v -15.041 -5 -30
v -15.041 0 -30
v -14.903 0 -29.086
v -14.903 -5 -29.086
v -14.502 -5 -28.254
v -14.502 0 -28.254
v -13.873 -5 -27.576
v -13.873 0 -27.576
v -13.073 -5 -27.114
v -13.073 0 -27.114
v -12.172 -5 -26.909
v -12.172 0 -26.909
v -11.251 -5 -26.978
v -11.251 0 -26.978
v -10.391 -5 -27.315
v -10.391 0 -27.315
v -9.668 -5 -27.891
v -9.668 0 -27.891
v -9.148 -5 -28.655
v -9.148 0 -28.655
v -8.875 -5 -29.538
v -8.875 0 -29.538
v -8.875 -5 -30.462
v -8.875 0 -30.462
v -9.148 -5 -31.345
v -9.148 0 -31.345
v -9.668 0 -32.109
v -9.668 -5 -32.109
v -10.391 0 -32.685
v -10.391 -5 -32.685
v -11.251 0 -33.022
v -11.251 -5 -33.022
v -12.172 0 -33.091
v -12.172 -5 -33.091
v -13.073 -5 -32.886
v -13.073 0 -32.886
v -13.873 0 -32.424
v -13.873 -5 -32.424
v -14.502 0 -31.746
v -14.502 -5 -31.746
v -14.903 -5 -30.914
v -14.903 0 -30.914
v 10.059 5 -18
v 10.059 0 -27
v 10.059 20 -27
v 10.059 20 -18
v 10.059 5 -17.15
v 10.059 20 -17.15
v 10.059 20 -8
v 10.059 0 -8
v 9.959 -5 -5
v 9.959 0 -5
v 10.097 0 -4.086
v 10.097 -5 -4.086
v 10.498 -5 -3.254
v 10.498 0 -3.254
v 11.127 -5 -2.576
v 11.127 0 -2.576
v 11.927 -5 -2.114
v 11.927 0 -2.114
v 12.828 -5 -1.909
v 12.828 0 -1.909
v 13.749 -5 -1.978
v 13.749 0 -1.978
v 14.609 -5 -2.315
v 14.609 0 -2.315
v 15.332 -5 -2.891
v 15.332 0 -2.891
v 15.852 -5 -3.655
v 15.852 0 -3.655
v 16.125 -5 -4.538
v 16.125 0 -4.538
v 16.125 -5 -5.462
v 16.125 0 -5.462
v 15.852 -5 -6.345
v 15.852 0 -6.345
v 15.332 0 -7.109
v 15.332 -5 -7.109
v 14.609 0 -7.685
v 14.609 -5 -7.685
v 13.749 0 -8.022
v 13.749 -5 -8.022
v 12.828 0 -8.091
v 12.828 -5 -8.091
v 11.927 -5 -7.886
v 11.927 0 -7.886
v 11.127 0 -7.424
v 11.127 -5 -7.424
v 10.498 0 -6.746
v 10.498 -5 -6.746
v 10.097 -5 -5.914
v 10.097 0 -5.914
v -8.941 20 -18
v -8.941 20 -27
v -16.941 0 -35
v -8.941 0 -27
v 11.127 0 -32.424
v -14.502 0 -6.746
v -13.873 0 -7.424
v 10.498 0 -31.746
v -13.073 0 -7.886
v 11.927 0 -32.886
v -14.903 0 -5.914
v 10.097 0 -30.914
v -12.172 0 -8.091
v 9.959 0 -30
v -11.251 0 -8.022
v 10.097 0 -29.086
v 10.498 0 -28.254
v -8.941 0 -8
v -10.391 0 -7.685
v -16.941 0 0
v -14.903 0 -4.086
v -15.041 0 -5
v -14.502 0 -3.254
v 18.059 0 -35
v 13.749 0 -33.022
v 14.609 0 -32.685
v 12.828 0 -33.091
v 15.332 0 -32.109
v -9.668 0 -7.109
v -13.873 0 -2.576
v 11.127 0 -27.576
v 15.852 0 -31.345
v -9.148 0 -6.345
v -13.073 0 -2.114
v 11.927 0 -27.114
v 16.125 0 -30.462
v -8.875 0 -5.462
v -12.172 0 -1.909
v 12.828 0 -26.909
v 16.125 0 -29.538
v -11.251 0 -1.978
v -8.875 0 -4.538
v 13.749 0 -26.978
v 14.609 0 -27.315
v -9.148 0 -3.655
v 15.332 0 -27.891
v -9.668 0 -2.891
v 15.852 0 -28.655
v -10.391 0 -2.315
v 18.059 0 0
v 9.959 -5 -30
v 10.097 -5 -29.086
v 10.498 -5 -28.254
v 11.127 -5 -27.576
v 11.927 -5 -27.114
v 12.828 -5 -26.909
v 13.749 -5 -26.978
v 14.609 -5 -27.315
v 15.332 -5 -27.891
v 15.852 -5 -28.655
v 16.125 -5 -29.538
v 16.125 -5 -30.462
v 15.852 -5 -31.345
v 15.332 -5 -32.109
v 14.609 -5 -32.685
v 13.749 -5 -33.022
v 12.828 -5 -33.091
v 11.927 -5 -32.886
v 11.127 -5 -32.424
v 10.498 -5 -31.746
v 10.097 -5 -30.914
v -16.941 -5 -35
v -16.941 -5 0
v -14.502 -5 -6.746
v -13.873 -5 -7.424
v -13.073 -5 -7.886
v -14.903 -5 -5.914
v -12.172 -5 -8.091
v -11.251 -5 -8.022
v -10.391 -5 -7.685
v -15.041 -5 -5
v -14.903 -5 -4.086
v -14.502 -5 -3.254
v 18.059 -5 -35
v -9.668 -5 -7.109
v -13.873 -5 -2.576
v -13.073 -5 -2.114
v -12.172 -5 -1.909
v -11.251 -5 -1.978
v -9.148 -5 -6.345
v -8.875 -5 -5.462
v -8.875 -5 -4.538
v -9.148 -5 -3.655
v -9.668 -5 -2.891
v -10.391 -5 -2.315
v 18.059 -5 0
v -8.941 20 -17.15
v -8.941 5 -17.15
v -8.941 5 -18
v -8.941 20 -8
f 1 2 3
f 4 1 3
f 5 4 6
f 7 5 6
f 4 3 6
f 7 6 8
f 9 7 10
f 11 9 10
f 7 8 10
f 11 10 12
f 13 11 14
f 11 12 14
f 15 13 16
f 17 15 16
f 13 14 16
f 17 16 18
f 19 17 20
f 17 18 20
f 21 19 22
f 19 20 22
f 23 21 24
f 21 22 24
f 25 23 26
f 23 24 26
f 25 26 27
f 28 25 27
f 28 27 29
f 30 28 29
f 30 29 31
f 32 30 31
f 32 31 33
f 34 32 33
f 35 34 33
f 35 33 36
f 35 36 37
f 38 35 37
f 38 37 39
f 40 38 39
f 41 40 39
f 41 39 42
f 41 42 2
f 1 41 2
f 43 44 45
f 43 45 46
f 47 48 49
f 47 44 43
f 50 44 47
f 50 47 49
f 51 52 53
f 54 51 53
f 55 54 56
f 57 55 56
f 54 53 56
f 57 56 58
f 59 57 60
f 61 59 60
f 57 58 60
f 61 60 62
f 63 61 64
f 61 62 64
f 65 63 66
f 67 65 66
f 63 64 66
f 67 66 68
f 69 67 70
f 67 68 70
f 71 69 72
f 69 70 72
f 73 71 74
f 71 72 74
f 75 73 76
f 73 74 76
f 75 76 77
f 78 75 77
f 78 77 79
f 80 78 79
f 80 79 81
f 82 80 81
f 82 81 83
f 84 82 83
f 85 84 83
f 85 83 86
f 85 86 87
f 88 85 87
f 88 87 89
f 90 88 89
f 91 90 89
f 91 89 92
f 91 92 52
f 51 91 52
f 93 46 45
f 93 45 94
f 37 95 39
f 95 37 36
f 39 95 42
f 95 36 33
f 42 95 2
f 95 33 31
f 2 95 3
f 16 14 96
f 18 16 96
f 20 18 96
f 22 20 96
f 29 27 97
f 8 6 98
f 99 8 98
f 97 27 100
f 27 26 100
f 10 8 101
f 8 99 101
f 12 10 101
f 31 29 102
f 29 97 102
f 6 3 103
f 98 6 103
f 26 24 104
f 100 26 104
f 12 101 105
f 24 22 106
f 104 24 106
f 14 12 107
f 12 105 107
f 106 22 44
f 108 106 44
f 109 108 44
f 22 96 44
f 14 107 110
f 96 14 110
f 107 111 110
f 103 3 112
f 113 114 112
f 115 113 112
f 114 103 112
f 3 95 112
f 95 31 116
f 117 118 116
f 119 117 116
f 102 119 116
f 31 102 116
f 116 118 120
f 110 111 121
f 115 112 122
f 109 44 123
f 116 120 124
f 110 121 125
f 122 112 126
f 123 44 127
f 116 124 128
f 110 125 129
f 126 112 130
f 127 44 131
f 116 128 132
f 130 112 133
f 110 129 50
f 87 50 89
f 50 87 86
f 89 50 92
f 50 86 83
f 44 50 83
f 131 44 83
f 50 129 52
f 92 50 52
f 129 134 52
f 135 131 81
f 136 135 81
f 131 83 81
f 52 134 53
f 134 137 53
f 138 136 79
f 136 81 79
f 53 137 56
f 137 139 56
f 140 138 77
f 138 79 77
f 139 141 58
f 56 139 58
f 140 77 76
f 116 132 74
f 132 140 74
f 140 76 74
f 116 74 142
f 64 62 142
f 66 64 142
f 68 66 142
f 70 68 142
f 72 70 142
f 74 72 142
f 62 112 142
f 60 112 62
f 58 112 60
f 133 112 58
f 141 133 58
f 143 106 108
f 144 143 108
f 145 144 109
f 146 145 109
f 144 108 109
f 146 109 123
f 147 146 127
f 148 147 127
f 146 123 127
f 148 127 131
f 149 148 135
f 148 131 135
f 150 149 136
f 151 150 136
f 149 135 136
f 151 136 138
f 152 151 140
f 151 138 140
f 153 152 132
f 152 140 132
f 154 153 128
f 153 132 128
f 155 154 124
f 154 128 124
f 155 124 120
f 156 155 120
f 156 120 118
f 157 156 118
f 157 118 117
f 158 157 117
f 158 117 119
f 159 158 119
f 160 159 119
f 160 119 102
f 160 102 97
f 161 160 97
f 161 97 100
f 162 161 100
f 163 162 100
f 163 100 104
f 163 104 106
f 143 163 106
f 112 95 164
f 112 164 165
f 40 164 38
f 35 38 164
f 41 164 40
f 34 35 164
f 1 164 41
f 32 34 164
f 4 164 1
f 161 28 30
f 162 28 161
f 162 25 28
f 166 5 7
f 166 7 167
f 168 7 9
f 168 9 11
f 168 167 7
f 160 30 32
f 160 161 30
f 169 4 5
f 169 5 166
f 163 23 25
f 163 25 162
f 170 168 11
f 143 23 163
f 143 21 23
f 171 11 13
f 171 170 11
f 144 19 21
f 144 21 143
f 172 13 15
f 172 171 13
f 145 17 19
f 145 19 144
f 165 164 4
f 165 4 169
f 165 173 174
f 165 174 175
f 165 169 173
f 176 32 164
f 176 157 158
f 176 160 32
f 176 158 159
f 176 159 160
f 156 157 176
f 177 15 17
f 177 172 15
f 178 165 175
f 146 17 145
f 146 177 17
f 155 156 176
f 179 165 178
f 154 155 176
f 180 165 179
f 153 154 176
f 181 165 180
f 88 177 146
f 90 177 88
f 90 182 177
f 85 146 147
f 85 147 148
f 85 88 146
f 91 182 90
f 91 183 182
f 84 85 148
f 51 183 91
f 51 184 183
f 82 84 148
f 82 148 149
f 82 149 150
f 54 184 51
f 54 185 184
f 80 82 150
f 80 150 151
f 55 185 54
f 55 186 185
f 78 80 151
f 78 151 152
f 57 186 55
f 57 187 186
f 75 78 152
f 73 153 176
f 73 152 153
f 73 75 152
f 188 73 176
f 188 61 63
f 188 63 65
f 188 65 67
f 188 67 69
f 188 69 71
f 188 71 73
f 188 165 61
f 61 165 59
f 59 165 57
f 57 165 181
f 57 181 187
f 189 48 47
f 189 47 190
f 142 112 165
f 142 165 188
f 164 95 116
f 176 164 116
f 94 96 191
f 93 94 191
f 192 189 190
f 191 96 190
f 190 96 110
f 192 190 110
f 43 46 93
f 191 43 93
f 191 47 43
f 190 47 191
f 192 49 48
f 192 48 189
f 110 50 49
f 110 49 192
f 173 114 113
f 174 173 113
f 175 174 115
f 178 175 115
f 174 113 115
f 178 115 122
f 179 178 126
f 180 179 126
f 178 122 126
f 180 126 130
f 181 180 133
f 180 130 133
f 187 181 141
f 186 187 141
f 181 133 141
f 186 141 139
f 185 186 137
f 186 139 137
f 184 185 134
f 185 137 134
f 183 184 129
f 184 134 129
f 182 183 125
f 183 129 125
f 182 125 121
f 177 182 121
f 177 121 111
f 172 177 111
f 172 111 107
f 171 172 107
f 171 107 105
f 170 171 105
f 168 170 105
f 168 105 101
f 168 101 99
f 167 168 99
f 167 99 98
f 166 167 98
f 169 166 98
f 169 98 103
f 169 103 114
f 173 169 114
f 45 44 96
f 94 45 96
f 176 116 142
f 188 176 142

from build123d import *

# Parameters (mm, degrees)
F0_W     = 35
F0_H     = 35
F1_DEPTH = 5
F2_R     = 3.1
F3_DEPTH = 5.001
F4_W     = 19
F4_H     = 19
F5_DEPTH = 20
F6_W     = 19
F6_H     = 0.85
F7_DEPTH = 15


with BuildPart() as f1:
    # F0 (on Front) → F1 (new body)
    with BuildSketch(Plane.XZ):
        with Locations((0.559466, -17.5)):
            Rectangle(F0_W, F0_H)
    extrude(amount=F1_DEPTH)

    # F2 (on face) → F3 (cut, through all)
    with BuildSketch(Plane(origin=(0, 0, 0), x_dir=(-1, 0, 0), z_dir=(0, 1, 0))):
        with Locations((-13.059466, -5)):
            Circle(F2_R)
        with Locations((11.940534, -5)):
            Circle(F2_R)
        with Locations((-13.059466, -30)):
            Circle(F2_R)
        with Locations((11.940534, -30)):
            Circle(F2_R)
    extrude(amount=-F3_DEPTH, mode=Mode.SUBTRACT)

    # F4 (on face) → F5 (join)
    with BuildSketch(Plane(origin=(0, 0, 0), x_dir=(-1, 0, 0), z_dir=(0, 1, 0))):
        with Locations((-0.559466, -17.5)):
            Rectangle(F4_W, F4_H)
    extrude(amount=F5_DEPTH)

    # F6 (on face) → F7 (cut)
    with BuildSketch(Plane(origin=(0, 20, 0), x_dir=(-1, 0, 0), z_dir=(0, 1, 0))):
        with Locations((-0.559466, -17.575)):
            Rectangle(F6_W, F6_H)
    extrude(amount=-F7_DEPTH, mode=Mode.SUBTRACT)


solid = f1.part
